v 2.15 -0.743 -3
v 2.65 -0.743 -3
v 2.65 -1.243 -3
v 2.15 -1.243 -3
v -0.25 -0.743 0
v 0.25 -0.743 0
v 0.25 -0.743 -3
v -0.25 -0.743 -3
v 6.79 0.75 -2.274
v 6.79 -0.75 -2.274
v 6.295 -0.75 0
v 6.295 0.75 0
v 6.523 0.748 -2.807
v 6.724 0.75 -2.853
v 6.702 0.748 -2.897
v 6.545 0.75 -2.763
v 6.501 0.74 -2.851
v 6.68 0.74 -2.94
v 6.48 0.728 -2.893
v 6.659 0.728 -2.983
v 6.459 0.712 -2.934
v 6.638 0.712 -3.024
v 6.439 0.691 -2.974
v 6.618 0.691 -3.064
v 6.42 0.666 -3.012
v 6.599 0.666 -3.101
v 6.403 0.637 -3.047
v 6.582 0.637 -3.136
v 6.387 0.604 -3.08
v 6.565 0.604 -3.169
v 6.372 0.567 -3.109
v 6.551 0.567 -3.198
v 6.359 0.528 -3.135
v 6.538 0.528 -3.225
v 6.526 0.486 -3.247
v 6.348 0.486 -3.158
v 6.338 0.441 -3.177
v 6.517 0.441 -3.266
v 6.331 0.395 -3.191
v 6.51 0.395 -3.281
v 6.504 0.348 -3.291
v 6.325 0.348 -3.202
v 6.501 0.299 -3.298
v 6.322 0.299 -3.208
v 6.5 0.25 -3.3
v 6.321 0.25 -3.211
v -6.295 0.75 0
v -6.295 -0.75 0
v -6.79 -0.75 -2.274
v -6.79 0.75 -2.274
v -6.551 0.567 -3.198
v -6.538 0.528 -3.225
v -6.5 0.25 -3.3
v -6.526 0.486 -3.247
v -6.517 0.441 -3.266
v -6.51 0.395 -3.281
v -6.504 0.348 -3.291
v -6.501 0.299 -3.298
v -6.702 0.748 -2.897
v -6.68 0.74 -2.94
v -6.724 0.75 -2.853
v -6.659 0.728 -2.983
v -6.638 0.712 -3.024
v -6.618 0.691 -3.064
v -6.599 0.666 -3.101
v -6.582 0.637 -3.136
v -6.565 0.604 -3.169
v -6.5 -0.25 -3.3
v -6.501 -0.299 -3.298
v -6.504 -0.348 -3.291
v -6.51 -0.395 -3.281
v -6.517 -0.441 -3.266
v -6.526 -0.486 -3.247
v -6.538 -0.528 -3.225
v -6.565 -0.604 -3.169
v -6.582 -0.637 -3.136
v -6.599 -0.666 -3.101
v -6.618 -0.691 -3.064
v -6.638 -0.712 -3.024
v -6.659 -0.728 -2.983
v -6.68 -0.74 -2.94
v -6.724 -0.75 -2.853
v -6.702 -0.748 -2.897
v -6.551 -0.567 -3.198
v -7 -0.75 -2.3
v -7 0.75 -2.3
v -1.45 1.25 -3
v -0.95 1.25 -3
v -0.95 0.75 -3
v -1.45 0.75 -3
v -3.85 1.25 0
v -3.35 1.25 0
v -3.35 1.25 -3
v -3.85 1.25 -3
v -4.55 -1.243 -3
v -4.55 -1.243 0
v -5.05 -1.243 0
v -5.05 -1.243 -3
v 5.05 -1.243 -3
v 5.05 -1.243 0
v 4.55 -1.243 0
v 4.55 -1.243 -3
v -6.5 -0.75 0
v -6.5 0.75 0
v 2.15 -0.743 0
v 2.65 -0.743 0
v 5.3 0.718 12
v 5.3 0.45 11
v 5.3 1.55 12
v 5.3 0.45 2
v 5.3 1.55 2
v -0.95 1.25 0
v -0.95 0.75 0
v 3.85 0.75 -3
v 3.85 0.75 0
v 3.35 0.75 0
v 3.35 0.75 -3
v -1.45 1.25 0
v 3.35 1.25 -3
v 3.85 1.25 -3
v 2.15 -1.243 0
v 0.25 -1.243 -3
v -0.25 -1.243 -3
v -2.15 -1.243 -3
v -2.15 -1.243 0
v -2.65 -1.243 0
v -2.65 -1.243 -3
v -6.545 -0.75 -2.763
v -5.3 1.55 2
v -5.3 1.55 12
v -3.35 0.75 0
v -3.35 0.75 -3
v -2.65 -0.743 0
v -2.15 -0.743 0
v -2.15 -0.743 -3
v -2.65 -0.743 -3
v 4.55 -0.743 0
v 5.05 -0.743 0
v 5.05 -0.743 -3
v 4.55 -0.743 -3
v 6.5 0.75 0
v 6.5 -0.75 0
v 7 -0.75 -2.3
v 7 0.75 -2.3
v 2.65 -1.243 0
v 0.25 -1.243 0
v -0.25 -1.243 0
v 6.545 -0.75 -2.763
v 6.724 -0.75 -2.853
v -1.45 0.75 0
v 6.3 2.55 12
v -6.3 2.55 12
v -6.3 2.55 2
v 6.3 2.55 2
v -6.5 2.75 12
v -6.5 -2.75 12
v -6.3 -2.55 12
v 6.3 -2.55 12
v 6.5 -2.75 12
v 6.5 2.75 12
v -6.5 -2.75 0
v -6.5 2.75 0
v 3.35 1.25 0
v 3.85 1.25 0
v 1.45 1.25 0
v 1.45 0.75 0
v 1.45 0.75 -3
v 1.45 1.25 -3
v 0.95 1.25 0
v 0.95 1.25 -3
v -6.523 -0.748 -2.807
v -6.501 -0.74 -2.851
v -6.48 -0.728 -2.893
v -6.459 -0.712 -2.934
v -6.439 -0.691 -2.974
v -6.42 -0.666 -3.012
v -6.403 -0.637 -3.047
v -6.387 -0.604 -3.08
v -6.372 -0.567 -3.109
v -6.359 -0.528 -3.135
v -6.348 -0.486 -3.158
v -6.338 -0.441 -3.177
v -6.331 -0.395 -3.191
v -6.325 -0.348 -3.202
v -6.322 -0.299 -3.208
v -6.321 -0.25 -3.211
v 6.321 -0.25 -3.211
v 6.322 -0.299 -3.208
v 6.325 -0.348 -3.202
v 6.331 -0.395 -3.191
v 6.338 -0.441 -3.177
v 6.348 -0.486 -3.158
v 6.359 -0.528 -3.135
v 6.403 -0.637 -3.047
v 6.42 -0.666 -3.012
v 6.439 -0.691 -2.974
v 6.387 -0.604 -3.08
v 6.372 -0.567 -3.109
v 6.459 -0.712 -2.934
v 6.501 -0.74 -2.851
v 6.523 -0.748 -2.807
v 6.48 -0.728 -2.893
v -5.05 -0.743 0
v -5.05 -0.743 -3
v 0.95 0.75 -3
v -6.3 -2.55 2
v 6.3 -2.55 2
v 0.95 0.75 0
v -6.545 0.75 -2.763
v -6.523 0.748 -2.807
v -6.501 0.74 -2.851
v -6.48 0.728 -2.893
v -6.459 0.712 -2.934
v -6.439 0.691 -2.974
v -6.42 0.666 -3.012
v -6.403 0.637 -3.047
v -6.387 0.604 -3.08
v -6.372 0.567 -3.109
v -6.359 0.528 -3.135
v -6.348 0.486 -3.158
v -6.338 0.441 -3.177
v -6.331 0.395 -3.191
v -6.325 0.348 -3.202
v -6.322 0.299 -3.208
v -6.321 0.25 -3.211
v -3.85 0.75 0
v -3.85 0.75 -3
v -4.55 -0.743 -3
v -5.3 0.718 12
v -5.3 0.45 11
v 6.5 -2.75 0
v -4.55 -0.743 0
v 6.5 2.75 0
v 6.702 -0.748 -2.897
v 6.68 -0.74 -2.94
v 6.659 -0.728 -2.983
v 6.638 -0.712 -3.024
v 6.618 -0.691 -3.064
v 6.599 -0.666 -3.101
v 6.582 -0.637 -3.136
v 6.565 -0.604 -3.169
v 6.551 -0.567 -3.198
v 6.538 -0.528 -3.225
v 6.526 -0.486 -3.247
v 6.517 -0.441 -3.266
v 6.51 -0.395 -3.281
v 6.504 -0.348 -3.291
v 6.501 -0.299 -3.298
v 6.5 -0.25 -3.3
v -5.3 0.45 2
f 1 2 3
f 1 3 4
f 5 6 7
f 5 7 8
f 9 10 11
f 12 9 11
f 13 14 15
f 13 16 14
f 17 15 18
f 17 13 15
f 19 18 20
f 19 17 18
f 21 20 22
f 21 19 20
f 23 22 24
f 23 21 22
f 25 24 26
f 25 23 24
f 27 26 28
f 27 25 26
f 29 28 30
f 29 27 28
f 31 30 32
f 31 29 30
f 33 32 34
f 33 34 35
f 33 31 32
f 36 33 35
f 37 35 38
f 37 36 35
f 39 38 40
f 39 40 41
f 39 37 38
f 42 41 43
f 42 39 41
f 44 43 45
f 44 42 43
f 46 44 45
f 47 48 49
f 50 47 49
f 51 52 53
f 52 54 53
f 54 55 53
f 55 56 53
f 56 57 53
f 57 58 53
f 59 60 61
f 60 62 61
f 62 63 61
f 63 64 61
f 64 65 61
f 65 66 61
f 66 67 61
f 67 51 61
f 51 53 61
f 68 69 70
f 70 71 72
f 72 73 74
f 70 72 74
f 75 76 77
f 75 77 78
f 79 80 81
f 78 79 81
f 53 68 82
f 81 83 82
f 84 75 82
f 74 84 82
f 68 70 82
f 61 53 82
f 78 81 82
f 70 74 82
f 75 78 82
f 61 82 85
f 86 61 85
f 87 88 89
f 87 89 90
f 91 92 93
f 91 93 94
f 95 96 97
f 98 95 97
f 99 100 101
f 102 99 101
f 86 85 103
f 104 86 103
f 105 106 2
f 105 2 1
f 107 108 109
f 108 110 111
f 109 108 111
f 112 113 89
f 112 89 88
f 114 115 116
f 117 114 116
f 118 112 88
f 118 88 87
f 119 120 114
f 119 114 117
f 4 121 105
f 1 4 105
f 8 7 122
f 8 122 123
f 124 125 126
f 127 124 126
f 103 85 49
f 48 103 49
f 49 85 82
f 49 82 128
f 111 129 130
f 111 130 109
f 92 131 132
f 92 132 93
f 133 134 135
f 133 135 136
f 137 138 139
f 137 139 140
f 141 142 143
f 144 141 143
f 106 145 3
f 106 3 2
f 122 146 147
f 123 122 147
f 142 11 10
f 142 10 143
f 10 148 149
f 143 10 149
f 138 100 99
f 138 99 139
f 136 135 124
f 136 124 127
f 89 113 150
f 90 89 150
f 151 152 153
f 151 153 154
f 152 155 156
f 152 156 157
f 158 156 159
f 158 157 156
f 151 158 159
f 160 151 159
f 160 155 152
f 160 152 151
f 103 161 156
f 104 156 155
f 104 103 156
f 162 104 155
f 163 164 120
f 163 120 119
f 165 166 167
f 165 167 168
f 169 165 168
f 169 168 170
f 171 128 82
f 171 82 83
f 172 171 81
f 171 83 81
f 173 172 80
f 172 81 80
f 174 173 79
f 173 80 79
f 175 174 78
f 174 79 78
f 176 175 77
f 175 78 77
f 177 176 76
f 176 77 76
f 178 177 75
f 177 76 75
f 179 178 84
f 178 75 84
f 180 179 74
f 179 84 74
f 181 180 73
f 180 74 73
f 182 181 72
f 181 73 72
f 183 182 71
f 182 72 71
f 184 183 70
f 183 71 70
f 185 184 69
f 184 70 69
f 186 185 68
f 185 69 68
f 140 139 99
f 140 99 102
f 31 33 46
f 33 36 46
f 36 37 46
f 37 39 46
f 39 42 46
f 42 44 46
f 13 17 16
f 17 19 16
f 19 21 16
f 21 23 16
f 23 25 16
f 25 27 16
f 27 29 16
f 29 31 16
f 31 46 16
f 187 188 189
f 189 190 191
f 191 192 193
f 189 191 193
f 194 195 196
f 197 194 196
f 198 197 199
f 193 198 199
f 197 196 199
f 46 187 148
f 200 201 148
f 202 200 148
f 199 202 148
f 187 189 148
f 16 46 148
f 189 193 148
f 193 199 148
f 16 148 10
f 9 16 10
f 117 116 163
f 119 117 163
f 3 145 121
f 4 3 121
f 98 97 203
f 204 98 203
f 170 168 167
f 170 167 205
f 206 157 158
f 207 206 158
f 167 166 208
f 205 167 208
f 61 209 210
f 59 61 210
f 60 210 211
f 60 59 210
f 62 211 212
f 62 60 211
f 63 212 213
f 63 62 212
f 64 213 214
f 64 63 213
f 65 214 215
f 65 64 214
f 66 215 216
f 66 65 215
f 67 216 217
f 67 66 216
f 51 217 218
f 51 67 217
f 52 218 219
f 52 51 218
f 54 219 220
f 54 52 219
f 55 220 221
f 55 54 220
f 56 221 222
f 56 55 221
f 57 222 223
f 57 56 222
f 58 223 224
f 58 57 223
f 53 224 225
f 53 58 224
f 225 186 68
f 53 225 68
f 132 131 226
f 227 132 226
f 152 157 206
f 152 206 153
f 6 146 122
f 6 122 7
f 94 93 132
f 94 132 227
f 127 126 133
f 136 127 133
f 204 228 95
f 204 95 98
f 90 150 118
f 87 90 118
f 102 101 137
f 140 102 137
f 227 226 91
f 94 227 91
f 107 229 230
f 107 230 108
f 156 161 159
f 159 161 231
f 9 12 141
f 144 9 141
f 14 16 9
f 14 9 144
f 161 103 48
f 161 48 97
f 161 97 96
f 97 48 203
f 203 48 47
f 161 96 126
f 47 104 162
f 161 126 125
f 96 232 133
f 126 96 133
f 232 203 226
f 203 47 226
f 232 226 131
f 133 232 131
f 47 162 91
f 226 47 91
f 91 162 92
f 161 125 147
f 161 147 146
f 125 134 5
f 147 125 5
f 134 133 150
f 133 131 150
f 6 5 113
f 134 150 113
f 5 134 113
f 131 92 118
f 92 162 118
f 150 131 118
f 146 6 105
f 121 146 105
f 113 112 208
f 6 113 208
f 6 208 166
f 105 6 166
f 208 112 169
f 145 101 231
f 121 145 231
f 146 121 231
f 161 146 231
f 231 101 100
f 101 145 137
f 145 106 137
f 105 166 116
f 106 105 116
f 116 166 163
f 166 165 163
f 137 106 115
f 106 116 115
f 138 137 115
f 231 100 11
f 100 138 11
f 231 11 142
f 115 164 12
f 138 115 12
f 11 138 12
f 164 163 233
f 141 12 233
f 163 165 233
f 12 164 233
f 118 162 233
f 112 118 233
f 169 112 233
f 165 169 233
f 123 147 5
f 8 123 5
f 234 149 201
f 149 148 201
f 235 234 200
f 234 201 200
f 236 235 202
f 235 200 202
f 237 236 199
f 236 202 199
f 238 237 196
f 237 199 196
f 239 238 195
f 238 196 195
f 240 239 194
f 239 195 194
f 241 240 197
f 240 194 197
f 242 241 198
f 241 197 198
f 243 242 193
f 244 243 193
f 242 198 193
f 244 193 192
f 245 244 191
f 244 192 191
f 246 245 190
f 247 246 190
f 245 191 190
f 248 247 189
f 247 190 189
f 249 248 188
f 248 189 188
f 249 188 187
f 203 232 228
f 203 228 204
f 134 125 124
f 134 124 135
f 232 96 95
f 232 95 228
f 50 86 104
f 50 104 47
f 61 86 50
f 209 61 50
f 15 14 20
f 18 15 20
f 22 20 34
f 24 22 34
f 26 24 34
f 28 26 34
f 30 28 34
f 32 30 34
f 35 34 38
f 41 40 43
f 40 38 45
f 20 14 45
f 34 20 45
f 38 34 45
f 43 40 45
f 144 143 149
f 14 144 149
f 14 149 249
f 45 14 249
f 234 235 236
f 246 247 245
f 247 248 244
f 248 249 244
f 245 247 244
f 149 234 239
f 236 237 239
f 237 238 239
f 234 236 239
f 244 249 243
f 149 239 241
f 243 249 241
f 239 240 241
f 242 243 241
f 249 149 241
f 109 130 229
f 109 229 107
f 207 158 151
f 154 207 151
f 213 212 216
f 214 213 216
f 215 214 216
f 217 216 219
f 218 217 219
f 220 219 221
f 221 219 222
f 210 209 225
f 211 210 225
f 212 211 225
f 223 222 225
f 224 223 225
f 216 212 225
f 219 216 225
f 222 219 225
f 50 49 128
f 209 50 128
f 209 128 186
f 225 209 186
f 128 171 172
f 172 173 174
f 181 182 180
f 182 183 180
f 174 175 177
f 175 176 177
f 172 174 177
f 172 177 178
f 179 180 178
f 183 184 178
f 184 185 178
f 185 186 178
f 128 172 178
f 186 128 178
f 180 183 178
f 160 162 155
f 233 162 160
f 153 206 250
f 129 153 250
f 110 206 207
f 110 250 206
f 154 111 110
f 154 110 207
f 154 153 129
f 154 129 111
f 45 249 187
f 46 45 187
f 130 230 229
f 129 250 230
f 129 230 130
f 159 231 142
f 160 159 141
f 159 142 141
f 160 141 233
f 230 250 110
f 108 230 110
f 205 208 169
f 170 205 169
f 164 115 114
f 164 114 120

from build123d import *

# Parameters (mm, degrees)
SKETCH_1_W          = 13
SKETCH_1_H          = 5.5
EXTRUDE_1_DEPTH     = 12
SKETCH_2_W          = 12.6
SKETCH_2_H          = 5.1
CUT_EXTRUDE_1_DEPTH = 10
SKETCH_5_W          = 10.6
SKETCH_5_H          = 1.1
EXTRUDE_3_DEPTH     = 10
CHAMFER_1_SIZE      = 1
CHAMFER_1_SIZE2     = 0.267949192
SKETCH_13_W         = 0.5
SKETCH_13_H         = 0.5
EXTRUDE_7_DEPTH     = 3
THICKEN_START       = -0.75
THICKEN_1_DEPTH     = 1.5
THICKEN_2_DEPTH     = 1.5
FILLET_2_R          = 0.5


# Read off the part's stored shape, not the designer's step: 加厚1, 加厚2
with BuildPart() as part:
    # 草图1 → 凸台-拉伸1 (new body)
    with BuildSketch(Plane.XY):
        Rectangle(SKETCH_1_W, SKETCH_1_H)
    extrude(amount=EXTRUDE_1_DEPTH)

    # 草图2 → 切除-拉伸1 (cut)
    with BuildSketch(Plane.XY.offset(12)):
        Rectangle(SKETCH_2_W, SKETCH_2_H)
    extrude(amount=-CUT_EXTRUDE_1_DEPTH, mode=Mode.SUBTRACT)

    # 草图5 → 凸台-拉伸3 (add)
    with BuildSketch(Plane.XY.offset(2)):
        with Locations((0, 1)):
            Rectangle(SKETCH_5_W, SKETCH_5_H)
    extrude(amount=EXTRUDE_3_DEPTH)

    # 倒角1
    chamfer_1_edges = [part.edges().sort_by_distance(p)[0] for p in [
        (0, 0.45, 12),
    ]]
    chamfer_1_side = [part.faces().sort_by_distance(p)[0] for p in [
        (0, 0.45, 7),
    ]]
    chamfer(chamfer_1_edges, length=CHAMFER_1_SIZE, length2=CHAMFER_1_SIZE2, reference=chamfer_1_side[0])

    # 草图13 → 凸台-拉伸7 (add)
    with BuildSketch(Plane(origin=(0, 0, 0), x_dir=(-1, 0, 0), z_dir=(0, 0, -1))):
        with Locations((-3.6, 1)):
            Rectangle(SKETCH_13_W, SKETCH_13_H)
        with Locations((-1.2, 1)):
            Rectangle(SKETCH_13_W, SKETCH_13_H)
        with Locations((1.2, 1)):
            Rectangle(SKETCH_13_W, SKETCH_13_H)
        with Locations((3.6, 1)):
            Rectangle(SKETCH_13_W, SKETCH_13_H)
        with Locations((-2.4, -0.993127881)):
            Rectangle(SKETCH_13_W, SKETCH_13_H)
        with Locations((-4.8, -0.993127881)):
            Rectangle(SKETCH_13_W, SKETCH_13_H)
        with Locations((0, -0.993127881)):
            Rectangle(SKETCH_13_W, SKETCH_13_H)
        with Locations((2.4, -0.993127881)):
            Rectangle(SKETCH_13_W, SKETCH_13_H)
        with Locations((4.8, -0.993127881)):
            Rectangle(SKETCH_13_W, SKETCH_13_H)
    extrude(amount=EXTRUDE_7_DEPTH)

    # 加厚1 outline → 加厚1 (add)
    with BuildSketch(Plane(origin=(0, 0, 0), x_dir=(1, 0, 0), z_dir=(0, 1, 0)).offset(THICKEN_START)):
        Polygon((6.78959064, 2.273605125), (6.295328656, 0), (6.5, 0), (7, 2.3), (6.5, 3.3), (6.321114562, 3.210557281), align=None)
    extrude(amount=THICKEN_1_DEPTH)

    # 加厚2 outline → 加厚2 (add)
    with BuildSketch(Plane(origin=(0, 0, 0), x_dir=(1, 0, 0), z_dir=(0, 1, 0)).offset(THICKEN_START)):
        Polygon((-6.5, 0), (-6.295328656, 0), (-6.78959064, 2.273605125), (-6.321114562, 3.210557281), (-6.5, 3.3), (-7, 2.3), align=None)
    extrude(amount=THICKEN_2_DEPTH)

    # 圆角2
    fillet_2_edges = [part.edges().sort_by_distance(p)[0] for p in [
        (6.410557281, -0.75, -3.25527864),
        (6.410557281, 0.75, -3.25527864),
        (-6.410557281, -0.75, -3.25527864),
        (-6.410557281, 0.75, -3.25527864),
    ]]
    fillet(fillet_2_edges, radius=FILLET_2_R)


solid = part.part
